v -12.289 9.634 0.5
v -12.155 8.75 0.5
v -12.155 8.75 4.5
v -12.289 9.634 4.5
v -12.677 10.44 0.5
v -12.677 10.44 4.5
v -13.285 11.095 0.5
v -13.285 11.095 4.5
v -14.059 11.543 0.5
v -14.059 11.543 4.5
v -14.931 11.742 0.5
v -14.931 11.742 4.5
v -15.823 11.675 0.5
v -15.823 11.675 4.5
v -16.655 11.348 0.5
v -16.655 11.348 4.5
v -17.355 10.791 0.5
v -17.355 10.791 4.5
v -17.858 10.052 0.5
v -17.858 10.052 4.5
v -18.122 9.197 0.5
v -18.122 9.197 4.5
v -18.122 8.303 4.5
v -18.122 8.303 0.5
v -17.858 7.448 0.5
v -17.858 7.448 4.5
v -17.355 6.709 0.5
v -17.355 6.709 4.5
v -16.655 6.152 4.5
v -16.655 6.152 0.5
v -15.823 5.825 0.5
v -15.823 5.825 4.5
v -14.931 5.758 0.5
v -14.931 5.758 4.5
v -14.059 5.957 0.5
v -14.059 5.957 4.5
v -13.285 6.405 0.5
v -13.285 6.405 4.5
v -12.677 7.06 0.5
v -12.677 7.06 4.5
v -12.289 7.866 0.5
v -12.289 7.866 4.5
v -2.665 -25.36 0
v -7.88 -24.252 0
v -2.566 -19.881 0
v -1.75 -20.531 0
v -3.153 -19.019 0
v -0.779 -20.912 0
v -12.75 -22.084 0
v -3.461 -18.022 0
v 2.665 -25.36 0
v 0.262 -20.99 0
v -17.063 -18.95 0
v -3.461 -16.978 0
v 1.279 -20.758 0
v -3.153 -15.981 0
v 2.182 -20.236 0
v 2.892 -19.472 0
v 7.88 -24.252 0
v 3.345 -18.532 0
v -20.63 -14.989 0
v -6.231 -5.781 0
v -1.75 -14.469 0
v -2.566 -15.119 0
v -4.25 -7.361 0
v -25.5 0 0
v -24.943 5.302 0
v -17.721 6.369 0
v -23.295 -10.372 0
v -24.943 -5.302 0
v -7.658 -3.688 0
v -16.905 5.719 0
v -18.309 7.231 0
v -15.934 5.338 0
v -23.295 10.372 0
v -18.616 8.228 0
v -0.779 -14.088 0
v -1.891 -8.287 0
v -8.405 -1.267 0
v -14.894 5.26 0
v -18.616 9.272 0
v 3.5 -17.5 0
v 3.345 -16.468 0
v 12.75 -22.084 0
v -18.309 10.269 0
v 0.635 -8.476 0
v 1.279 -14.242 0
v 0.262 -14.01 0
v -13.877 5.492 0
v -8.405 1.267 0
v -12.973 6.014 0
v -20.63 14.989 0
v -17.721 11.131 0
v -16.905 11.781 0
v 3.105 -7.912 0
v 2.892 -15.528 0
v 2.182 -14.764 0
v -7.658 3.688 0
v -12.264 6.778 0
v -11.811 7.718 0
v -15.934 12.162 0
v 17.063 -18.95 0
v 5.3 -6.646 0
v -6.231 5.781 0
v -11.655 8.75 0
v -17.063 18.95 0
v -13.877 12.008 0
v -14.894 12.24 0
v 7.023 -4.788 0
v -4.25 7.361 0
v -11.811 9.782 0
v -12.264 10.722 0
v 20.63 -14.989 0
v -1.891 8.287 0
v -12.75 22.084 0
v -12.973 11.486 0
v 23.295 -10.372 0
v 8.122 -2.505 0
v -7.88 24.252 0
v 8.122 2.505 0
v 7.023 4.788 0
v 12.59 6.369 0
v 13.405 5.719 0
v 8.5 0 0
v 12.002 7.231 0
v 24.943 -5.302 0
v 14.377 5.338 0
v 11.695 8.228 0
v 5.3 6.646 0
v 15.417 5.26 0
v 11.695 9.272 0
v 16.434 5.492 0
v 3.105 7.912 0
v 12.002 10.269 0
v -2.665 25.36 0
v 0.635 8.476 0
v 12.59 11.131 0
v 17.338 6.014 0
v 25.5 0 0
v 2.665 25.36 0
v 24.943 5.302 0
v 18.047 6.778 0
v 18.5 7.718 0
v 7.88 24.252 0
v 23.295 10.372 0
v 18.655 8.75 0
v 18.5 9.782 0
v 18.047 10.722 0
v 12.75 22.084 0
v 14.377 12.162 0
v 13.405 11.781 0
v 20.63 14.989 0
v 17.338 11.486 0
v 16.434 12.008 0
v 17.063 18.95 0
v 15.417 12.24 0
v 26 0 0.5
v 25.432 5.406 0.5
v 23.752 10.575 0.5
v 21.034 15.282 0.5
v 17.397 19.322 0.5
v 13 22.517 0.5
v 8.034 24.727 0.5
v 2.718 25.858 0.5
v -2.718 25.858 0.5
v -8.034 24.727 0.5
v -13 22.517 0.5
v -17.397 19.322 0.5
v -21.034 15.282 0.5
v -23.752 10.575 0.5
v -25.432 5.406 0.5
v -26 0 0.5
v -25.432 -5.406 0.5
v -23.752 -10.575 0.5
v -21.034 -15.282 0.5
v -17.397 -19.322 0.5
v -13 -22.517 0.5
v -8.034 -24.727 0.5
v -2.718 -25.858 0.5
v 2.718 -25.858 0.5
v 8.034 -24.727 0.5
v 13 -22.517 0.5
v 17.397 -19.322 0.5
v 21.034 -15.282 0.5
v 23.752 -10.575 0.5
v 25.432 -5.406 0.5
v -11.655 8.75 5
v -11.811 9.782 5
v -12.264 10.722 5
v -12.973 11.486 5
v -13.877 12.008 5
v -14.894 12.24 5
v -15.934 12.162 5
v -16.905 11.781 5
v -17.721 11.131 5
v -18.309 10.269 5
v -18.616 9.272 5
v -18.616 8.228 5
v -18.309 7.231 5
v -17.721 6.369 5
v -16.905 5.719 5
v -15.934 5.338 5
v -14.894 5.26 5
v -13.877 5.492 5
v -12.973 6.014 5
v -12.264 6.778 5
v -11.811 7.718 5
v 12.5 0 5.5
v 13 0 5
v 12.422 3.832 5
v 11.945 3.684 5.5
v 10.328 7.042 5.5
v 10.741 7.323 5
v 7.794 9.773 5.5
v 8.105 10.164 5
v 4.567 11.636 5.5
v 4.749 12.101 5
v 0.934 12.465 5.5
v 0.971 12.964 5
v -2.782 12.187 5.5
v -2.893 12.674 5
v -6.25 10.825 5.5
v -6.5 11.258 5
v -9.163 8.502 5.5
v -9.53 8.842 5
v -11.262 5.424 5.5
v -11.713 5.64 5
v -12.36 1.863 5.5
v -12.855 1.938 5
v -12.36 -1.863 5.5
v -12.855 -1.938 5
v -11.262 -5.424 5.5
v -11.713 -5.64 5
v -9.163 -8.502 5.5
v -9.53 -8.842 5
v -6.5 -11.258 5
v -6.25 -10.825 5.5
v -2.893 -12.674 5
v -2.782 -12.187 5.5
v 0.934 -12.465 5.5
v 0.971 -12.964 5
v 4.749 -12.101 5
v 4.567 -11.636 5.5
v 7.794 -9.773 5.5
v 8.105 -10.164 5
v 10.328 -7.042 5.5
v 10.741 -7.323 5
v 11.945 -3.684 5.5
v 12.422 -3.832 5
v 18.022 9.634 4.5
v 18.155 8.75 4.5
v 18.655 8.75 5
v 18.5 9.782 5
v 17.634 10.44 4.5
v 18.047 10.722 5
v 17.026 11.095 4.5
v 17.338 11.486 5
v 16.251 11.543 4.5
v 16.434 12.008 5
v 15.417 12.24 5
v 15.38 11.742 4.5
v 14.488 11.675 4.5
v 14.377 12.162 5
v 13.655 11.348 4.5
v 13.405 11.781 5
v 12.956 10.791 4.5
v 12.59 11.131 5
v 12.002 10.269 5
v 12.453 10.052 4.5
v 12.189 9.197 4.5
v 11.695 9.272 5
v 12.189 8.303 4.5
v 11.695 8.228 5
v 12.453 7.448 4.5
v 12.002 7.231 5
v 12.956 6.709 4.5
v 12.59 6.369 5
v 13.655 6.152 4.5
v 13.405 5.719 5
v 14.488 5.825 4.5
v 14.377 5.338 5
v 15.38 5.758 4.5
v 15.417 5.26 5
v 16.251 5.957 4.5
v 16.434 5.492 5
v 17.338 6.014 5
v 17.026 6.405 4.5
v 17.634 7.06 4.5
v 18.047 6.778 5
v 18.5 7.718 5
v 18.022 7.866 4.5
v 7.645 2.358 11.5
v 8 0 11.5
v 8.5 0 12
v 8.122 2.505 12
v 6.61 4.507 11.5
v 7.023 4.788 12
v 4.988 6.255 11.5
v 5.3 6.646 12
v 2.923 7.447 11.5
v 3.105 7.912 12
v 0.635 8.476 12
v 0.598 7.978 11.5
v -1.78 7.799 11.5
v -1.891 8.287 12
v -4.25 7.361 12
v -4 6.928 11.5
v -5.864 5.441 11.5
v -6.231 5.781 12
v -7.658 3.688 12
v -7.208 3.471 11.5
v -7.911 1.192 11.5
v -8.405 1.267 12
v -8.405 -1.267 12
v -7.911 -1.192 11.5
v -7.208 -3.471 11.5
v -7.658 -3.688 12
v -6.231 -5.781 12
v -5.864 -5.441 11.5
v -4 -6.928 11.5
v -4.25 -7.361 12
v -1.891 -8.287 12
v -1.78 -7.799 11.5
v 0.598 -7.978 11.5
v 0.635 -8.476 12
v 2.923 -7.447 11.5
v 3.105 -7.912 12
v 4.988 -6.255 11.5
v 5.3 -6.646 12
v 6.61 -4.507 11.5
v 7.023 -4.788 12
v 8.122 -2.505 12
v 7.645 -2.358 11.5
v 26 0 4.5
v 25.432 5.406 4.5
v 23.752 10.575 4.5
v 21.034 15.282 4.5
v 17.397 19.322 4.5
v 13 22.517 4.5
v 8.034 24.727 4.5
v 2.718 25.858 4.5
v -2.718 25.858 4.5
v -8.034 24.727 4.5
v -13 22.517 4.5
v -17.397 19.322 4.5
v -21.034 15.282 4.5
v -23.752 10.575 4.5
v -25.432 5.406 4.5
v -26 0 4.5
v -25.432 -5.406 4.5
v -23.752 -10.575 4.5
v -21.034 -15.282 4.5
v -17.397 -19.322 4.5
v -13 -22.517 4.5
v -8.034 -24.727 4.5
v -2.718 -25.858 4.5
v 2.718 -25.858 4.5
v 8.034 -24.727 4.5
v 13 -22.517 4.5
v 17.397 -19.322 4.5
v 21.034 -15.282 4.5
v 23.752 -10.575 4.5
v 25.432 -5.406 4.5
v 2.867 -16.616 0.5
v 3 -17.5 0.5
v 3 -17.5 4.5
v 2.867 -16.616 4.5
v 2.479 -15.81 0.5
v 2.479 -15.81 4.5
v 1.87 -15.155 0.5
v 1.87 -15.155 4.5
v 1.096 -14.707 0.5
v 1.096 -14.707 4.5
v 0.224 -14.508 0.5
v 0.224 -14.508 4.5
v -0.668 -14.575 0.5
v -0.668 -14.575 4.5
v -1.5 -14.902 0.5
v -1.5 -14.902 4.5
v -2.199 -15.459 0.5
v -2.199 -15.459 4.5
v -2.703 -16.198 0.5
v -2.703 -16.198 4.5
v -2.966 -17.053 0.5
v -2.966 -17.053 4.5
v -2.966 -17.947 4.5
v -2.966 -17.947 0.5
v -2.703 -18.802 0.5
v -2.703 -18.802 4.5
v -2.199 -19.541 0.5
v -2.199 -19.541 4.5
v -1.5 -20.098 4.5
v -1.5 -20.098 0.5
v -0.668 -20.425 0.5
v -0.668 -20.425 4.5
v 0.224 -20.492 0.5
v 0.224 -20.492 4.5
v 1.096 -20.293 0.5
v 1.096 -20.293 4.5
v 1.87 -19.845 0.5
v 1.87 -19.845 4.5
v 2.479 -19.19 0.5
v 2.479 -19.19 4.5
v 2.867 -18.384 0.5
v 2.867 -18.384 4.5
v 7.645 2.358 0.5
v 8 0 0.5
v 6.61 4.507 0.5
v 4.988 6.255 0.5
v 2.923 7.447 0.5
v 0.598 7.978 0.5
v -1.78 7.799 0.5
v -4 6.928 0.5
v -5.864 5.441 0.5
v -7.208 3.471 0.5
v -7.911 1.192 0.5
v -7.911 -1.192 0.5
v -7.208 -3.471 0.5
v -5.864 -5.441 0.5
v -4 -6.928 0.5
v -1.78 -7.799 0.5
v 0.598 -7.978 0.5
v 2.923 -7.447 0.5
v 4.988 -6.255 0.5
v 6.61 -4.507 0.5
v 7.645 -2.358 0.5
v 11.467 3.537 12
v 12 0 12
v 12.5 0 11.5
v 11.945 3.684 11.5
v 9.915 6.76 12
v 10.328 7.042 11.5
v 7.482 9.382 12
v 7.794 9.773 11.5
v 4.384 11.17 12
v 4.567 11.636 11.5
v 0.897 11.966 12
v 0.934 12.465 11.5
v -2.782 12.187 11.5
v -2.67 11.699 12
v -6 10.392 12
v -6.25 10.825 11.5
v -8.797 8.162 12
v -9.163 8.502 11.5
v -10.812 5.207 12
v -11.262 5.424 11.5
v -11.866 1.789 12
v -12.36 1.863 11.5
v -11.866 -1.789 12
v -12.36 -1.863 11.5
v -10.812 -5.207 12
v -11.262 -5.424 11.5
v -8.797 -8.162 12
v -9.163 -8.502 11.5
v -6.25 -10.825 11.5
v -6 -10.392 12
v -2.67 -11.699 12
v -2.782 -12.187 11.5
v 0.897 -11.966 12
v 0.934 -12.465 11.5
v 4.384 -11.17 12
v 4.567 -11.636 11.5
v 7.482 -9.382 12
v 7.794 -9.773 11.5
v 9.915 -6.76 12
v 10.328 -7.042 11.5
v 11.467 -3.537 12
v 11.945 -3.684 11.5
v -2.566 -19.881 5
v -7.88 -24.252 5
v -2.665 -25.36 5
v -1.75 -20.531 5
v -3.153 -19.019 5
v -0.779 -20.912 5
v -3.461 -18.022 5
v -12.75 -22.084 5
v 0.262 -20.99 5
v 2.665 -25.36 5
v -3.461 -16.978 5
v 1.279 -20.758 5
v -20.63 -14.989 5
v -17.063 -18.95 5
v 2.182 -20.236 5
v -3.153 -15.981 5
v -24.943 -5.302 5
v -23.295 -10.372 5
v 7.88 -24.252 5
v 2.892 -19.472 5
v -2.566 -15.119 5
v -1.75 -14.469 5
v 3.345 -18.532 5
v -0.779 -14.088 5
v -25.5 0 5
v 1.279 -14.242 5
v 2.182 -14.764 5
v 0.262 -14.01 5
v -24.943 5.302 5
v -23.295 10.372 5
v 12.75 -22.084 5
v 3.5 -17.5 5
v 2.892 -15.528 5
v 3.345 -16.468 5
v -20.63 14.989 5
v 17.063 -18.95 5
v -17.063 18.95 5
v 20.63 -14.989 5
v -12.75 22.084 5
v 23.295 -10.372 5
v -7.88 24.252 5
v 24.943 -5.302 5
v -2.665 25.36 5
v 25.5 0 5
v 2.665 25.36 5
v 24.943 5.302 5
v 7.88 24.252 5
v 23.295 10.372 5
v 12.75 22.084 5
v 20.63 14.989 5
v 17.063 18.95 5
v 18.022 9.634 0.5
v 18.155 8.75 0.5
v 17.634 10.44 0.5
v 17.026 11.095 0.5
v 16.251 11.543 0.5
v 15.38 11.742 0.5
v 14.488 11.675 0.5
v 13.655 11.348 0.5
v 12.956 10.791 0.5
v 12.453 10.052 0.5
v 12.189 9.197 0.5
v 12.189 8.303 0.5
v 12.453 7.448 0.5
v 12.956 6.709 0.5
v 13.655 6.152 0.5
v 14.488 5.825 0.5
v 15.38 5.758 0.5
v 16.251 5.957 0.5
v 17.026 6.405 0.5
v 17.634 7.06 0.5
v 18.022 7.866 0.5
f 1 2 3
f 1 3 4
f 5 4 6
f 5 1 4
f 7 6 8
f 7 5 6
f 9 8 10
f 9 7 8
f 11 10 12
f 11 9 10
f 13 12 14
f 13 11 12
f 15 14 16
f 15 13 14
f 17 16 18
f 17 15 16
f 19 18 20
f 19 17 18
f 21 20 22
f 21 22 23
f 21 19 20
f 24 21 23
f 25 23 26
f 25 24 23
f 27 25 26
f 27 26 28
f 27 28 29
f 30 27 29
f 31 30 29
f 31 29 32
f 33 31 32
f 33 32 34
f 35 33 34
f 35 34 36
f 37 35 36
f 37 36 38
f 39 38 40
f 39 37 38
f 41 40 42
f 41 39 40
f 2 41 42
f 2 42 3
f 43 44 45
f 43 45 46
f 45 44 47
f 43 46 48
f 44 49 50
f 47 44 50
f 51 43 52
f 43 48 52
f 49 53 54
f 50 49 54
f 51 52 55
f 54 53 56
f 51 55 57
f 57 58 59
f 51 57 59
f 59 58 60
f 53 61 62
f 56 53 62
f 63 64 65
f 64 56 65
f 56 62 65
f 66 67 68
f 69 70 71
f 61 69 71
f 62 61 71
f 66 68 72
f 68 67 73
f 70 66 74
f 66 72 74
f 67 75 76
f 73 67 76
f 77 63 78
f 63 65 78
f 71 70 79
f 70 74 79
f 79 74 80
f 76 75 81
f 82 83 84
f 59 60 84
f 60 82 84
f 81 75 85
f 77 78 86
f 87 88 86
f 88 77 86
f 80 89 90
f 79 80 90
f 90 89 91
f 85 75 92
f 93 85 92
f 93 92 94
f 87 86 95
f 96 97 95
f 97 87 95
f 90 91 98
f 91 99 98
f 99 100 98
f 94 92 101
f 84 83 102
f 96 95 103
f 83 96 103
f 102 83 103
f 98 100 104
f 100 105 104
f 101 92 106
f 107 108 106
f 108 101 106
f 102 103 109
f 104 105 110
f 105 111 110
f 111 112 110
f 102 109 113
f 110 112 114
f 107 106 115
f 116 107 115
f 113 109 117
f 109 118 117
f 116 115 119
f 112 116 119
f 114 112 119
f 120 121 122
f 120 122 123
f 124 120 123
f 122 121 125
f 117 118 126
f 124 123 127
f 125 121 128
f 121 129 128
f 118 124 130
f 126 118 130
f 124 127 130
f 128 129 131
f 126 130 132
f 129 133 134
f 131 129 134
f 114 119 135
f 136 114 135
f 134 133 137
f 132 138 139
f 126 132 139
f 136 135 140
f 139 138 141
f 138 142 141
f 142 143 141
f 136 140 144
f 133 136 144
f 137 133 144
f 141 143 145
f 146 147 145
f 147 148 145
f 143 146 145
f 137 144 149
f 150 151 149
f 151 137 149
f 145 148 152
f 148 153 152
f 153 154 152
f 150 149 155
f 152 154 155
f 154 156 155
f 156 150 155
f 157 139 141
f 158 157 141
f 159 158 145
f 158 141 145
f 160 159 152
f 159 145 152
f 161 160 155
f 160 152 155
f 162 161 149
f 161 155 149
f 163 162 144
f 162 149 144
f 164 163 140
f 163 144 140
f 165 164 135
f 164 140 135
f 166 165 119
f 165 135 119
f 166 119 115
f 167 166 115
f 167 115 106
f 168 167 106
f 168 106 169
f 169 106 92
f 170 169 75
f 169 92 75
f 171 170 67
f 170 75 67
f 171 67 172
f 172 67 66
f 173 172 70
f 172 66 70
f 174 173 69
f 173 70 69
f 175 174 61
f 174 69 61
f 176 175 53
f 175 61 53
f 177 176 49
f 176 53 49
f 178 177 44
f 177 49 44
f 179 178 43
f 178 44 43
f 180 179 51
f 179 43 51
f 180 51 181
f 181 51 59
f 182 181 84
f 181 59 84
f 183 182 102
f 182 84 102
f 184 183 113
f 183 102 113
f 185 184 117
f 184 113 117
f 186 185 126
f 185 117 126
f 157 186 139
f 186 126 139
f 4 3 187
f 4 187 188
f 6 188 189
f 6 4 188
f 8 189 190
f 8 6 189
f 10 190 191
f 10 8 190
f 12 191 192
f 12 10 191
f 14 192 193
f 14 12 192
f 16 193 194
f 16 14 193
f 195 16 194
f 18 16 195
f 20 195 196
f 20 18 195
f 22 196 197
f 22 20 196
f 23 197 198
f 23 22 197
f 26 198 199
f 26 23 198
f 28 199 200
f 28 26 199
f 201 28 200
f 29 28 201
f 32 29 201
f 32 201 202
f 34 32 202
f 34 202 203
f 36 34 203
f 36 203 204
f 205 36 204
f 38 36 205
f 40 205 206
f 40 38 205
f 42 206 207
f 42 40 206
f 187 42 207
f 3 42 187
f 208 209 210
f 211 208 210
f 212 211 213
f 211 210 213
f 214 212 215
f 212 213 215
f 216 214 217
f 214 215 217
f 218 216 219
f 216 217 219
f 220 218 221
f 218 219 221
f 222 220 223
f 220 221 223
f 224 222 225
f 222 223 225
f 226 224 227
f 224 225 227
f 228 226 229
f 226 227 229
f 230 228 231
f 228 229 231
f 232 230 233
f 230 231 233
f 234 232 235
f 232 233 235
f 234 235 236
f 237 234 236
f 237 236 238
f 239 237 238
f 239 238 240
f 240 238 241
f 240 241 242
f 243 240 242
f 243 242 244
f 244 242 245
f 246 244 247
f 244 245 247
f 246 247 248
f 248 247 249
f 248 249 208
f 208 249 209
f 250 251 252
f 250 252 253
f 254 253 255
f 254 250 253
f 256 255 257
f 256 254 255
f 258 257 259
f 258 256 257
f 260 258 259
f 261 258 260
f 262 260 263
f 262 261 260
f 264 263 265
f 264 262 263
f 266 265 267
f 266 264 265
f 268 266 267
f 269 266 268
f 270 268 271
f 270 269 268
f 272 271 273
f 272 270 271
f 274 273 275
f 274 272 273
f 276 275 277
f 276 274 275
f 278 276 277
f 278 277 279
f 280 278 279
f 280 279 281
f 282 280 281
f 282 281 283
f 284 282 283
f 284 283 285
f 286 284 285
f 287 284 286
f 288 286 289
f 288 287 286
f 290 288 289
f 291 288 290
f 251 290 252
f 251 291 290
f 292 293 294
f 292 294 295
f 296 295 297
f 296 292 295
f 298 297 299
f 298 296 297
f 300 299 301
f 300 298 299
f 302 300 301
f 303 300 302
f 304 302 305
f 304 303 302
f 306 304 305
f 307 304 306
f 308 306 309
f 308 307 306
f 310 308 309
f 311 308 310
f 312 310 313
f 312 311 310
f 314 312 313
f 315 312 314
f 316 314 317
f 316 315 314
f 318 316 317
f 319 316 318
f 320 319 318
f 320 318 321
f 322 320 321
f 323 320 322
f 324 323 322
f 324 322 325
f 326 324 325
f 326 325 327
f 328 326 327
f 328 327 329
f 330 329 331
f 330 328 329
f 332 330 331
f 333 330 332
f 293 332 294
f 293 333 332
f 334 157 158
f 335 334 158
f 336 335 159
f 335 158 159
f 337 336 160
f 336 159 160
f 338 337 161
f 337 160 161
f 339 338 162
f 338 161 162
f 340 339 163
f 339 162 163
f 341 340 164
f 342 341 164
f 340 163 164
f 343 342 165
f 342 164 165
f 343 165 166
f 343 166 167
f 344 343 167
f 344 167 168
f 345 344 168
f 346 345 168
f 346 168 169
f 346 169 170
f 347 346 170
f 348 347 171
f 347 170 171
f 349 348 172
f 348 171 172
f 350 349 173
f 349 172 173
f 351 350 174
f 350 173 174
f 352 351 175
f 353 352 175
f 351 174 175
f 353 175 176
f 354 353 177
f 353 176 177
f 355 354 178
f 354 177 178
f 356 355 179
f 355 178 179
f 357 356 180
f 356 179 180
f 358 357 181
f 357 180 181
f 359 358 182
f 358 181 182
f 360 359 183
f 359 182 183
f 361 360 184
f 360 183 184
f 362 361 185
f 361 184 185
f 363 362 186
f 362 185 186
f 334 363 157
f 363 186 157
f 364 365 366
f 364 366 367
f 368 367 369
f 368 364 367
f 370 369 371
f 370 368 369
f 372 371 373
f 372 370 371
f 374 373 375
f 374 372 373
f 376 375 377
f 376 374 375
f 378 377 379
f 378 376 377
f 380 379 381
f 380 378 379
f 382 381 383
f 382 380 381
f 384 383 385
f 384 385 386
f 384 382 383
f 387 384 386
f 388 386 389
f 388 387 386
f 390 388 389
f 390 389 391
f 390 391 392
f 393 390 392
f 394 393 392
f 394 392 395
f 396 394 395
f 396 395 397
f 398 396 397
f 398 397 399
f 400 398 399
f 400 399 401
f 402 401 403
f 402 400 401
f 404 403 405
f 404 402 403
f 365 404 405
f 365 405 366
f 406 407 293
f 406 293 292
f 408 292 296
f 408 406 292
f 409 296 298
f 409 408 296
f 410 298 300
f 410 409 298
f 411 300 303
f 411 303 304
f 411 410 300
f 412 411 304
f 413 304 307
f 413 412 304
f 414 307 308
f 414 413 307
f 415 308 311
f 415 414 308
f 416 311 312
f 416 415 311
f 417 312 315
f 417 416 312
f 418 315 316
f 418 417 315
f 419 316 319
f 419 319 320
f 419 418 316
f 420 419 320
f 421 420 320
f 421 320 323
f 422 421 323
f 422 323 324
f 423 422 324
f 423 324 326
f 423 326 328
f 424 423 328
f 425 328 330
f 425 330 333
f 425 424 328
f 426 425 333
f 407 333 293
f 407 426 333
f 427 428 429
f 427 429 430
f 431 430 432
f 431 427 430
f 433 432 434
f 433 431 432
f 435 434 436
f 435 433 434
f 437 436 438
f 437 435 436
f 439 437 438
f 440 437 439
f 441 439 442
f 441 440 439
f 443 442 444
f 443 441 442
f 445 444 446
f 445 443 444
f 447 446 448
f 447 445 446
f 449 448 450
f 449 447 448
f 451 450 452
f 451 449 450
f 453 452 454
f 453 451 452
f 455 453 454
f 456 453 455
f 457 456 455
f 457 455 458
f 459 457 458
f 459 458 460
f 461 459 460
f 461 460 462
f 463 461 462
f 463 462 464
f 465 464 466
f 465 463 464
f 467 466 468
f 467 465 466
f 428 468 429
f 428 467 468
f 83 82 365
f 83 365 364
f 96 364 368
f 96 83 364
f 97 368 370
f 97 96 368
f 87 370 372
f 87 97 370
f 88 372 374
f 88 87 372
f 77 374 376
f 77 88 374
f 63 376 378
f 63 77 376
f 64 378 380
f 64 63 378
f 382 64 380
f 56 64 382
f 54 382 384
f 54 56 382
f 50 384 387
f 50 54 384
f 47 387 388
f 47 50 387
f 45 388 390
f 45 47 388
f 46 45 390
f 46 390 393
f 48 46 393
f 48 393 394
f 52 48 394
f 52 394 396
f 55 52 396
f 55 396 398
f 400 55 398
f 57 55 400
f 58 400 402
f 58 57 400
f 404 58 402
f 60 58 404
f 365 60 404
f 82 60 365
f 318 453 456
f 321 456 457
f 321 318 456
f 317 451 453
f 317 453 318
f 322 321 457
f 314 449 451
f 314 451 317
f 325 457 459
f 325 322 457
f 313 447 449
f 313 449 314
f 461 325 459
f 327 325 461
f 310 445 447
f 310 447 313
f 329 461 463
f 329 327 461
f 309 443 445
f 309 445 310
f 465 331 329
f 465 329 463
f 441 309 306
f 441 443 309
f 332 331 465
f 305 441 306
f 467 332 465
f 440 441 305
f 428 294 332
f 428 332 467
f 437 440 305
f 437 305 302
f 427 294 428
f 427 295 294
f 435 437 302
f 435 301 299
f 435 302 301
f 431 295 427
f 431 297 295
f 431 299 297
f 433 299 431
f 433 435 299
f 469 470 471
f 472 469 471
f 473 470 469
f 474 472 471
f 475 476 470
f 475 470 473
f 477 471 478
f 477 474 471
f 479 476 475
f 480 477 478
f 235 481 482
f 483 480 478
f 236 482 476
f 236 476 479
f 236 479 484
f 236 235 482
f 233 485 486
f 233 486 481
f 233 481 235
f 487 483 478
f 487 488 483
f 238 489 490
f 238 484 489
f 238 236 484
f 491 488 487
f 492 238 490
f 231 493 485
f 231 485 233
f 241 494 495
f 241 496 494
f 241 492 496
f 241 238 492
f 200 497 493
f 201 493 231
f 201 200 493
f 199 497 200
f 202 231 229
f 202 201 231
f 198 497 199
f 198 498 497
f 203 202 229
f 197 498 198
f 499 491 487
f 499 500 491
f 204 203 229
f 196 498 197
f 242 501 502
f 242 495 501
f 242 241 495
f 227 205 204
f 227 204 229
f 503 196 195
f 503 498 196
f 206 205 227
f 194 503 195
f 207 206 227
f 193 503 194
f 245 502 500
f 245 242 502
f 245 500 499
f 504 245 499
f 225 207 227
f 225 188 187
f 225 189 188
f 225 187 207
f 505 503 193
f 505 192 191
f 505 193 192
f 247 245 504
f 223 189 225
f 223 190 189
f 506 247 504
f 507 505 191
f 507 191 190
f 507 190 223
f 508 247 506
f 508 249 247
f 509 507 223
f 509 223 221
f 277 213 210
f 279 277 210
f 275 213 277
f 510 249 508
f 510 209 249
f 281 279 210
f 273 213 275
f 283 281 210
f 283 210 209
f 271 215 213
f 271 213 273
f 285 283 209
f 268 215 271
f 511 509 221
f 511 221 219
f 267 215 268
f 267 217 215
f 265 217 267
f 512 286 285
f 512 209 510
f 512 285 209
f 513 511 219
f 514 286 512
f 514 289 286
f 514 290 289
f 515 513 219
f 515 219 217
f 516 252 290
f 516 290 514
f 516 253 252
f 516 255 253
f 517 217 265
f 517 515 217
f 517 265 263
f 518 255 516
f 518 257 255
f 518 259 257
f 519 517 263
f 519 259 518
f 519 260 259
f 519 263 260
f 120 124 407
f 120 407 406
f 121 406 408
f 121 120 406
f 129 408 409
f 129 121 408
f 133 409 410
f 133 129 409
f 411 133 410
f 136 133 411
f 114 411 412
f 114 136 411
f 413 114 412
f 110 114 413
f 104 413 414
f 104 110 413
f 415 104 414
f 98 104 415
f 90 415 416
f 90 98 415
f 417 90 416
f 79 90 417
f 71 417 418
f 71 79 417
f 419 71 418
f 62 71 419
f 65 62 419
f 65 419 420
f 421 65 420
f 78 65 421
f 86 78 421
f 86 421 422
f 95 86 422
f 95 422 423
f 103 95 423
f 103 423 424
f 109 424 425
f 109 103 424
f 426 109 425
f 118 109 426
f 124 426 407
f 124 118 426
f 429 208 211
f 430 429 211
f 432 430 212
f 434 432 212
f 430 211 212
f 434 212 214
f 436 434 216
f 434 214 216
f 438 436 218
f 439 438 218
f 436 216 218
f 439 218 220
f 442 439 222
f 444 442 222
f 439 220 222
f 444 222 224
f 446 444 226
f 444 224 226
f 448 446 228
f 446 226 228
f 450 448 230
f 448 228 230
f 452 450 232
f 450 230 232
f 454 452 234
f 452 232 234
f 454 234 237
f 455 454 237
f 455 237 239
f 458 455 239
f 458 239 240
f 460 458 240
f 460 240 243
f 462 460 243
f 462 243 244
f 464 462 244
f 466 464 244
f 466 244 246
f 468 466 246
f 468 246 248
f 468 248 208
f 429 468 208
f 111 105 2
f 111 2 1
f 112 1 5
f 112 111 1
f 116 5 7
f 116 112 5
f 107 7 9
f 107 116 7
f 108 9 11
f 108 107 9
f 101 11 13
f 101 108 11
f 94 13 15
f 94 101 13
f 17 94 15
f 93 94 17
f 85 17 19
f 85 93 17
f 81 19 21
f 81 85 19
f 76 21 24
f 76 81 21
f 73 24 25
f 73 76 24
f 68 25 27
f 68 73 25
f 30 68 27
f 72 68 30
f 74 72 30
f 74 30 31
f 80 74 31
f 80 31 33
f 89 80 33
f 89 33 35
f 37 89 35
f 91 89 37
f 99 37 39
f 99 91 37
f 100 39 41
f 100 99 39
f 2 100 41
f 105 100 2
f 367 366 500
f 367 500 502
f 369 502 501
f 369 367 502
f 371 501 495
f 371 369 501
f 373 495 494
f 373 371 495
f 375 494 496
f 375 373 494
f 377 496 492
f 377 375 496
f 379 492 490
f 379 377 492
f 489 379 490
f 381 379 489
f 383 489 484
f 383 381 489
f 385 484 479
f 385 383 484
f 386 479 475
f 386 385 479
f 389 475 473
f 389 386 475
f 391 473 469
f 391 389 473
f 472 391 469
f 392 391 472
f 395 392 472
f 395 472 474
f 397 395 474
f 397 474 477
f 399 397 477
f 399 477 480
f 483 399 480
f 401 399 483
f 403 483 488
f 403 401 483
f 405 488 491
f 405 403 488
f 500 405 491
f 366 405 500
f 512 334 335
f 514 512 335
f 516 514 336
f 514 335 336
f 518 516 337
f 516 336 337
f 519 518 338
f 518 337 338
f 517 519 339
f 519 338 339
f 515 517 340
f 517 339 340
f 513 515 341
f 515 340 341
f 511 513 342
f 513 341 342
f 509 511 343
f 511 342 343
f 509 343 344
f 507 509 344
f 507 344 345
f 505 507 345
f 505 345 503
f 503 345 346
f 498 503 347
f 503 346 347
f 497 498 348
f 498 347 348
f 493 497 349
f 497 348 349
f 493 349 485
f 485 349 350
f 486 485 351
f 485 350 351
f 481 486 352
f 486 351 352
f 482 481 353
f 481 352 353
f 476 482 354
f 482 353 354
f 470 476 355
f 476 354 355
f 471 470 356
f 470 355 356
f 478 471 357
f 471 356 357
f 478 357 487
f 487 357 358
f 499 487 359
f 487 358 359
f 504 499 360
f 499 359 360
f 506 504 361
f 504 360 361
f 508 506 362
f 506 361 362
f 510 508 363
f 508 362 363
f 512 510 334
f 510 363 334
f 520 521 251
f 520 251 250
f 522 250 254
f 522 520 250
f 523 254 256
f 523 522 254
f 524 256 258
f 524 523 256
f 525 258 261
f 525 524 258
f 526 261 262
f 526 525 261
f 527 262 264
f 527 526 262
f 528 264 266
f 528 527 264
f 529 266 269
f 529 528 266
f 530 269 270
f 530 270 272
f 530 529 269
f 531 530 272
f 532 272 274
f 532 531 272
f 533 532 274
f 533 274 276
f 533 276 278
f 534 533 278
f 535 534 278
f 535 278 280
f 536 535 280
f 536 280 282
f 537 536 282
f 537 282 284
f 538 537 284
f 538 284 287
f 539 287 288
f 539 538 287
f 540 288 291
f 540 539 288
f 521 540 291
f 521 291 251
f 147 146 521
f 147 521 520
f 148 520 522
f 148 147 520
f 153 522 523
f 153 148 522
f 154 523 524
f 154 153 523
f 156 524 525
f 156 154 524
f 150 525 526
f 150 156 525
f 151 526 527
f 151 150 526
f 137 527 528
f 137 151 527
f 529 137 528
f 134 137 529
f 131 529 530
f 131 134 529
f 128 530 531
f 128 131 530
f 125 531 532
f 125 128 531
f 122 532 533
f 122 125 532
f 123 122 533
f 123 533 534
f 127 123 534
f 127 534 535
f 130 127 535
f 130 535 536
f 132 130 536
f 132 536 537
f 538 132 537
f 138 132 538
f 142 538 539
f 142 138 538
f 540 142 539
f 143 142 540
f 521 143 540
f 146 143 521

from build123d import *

# Parameters (mm, degrees)
F0_R     = 26
F0_R_2   = 3
F0_R_3   = 12.5
F1_DEPTH = 5
F0_R_4   = 8
F2_DEPTH = 12
F3_SIZE  = 0.5


with BuildPart() as f1:
    # F0 (on Top) → F1 (new body)
    with BuildSketch(Plane.XY):
        Circle(F0_R)
        with Locations((0, -17.5)):
            Circle(F0_R_2, mode=Mode.SUBTRACT)
        with Locations((-15.155445, 8.75)):
            Circle(F0_R_2, mode=Mode.SUBTRACT)
        Circle(F0_R_3, mode=Mode.SUBTRACT)
        with Locations((15.155445, 8.75)):
            Circle(F0_R_2, mode=Mode.SUBTRACT)
    extrude(amount=F1_DEPTH)

    # F0 (on Top) → F2 (join)
    with BuildSketch(Plane.XY):
        Circle(F0_R_3)
        Circle(F0_R_4, mode=Mode.SUBTRACT)
    extrude(amount=F2_DEPTH)

    # F3
    f3_edges = [f1.edges().sort_by_distance(p)[0] for p in [
        (-12.5, 0, 12),
        (-8, 0, 12),
        (-26, 0, 5),
        (-3, -17.5, 5),
        (-18.155445, 8.75, 5),
        (-12.5, 0, 5),
        (12.155445, 8.75, 5),
        (-26, 0, 0),
        (-3, -17.5, 0),
        (-18.155445, 8.75, 0),
        (12.155445, 8.75, 0),
        (-8, 0, 0),
    ]]
    chamfer(f3_edges, length=F3_SIZE)


solid = f1.part
